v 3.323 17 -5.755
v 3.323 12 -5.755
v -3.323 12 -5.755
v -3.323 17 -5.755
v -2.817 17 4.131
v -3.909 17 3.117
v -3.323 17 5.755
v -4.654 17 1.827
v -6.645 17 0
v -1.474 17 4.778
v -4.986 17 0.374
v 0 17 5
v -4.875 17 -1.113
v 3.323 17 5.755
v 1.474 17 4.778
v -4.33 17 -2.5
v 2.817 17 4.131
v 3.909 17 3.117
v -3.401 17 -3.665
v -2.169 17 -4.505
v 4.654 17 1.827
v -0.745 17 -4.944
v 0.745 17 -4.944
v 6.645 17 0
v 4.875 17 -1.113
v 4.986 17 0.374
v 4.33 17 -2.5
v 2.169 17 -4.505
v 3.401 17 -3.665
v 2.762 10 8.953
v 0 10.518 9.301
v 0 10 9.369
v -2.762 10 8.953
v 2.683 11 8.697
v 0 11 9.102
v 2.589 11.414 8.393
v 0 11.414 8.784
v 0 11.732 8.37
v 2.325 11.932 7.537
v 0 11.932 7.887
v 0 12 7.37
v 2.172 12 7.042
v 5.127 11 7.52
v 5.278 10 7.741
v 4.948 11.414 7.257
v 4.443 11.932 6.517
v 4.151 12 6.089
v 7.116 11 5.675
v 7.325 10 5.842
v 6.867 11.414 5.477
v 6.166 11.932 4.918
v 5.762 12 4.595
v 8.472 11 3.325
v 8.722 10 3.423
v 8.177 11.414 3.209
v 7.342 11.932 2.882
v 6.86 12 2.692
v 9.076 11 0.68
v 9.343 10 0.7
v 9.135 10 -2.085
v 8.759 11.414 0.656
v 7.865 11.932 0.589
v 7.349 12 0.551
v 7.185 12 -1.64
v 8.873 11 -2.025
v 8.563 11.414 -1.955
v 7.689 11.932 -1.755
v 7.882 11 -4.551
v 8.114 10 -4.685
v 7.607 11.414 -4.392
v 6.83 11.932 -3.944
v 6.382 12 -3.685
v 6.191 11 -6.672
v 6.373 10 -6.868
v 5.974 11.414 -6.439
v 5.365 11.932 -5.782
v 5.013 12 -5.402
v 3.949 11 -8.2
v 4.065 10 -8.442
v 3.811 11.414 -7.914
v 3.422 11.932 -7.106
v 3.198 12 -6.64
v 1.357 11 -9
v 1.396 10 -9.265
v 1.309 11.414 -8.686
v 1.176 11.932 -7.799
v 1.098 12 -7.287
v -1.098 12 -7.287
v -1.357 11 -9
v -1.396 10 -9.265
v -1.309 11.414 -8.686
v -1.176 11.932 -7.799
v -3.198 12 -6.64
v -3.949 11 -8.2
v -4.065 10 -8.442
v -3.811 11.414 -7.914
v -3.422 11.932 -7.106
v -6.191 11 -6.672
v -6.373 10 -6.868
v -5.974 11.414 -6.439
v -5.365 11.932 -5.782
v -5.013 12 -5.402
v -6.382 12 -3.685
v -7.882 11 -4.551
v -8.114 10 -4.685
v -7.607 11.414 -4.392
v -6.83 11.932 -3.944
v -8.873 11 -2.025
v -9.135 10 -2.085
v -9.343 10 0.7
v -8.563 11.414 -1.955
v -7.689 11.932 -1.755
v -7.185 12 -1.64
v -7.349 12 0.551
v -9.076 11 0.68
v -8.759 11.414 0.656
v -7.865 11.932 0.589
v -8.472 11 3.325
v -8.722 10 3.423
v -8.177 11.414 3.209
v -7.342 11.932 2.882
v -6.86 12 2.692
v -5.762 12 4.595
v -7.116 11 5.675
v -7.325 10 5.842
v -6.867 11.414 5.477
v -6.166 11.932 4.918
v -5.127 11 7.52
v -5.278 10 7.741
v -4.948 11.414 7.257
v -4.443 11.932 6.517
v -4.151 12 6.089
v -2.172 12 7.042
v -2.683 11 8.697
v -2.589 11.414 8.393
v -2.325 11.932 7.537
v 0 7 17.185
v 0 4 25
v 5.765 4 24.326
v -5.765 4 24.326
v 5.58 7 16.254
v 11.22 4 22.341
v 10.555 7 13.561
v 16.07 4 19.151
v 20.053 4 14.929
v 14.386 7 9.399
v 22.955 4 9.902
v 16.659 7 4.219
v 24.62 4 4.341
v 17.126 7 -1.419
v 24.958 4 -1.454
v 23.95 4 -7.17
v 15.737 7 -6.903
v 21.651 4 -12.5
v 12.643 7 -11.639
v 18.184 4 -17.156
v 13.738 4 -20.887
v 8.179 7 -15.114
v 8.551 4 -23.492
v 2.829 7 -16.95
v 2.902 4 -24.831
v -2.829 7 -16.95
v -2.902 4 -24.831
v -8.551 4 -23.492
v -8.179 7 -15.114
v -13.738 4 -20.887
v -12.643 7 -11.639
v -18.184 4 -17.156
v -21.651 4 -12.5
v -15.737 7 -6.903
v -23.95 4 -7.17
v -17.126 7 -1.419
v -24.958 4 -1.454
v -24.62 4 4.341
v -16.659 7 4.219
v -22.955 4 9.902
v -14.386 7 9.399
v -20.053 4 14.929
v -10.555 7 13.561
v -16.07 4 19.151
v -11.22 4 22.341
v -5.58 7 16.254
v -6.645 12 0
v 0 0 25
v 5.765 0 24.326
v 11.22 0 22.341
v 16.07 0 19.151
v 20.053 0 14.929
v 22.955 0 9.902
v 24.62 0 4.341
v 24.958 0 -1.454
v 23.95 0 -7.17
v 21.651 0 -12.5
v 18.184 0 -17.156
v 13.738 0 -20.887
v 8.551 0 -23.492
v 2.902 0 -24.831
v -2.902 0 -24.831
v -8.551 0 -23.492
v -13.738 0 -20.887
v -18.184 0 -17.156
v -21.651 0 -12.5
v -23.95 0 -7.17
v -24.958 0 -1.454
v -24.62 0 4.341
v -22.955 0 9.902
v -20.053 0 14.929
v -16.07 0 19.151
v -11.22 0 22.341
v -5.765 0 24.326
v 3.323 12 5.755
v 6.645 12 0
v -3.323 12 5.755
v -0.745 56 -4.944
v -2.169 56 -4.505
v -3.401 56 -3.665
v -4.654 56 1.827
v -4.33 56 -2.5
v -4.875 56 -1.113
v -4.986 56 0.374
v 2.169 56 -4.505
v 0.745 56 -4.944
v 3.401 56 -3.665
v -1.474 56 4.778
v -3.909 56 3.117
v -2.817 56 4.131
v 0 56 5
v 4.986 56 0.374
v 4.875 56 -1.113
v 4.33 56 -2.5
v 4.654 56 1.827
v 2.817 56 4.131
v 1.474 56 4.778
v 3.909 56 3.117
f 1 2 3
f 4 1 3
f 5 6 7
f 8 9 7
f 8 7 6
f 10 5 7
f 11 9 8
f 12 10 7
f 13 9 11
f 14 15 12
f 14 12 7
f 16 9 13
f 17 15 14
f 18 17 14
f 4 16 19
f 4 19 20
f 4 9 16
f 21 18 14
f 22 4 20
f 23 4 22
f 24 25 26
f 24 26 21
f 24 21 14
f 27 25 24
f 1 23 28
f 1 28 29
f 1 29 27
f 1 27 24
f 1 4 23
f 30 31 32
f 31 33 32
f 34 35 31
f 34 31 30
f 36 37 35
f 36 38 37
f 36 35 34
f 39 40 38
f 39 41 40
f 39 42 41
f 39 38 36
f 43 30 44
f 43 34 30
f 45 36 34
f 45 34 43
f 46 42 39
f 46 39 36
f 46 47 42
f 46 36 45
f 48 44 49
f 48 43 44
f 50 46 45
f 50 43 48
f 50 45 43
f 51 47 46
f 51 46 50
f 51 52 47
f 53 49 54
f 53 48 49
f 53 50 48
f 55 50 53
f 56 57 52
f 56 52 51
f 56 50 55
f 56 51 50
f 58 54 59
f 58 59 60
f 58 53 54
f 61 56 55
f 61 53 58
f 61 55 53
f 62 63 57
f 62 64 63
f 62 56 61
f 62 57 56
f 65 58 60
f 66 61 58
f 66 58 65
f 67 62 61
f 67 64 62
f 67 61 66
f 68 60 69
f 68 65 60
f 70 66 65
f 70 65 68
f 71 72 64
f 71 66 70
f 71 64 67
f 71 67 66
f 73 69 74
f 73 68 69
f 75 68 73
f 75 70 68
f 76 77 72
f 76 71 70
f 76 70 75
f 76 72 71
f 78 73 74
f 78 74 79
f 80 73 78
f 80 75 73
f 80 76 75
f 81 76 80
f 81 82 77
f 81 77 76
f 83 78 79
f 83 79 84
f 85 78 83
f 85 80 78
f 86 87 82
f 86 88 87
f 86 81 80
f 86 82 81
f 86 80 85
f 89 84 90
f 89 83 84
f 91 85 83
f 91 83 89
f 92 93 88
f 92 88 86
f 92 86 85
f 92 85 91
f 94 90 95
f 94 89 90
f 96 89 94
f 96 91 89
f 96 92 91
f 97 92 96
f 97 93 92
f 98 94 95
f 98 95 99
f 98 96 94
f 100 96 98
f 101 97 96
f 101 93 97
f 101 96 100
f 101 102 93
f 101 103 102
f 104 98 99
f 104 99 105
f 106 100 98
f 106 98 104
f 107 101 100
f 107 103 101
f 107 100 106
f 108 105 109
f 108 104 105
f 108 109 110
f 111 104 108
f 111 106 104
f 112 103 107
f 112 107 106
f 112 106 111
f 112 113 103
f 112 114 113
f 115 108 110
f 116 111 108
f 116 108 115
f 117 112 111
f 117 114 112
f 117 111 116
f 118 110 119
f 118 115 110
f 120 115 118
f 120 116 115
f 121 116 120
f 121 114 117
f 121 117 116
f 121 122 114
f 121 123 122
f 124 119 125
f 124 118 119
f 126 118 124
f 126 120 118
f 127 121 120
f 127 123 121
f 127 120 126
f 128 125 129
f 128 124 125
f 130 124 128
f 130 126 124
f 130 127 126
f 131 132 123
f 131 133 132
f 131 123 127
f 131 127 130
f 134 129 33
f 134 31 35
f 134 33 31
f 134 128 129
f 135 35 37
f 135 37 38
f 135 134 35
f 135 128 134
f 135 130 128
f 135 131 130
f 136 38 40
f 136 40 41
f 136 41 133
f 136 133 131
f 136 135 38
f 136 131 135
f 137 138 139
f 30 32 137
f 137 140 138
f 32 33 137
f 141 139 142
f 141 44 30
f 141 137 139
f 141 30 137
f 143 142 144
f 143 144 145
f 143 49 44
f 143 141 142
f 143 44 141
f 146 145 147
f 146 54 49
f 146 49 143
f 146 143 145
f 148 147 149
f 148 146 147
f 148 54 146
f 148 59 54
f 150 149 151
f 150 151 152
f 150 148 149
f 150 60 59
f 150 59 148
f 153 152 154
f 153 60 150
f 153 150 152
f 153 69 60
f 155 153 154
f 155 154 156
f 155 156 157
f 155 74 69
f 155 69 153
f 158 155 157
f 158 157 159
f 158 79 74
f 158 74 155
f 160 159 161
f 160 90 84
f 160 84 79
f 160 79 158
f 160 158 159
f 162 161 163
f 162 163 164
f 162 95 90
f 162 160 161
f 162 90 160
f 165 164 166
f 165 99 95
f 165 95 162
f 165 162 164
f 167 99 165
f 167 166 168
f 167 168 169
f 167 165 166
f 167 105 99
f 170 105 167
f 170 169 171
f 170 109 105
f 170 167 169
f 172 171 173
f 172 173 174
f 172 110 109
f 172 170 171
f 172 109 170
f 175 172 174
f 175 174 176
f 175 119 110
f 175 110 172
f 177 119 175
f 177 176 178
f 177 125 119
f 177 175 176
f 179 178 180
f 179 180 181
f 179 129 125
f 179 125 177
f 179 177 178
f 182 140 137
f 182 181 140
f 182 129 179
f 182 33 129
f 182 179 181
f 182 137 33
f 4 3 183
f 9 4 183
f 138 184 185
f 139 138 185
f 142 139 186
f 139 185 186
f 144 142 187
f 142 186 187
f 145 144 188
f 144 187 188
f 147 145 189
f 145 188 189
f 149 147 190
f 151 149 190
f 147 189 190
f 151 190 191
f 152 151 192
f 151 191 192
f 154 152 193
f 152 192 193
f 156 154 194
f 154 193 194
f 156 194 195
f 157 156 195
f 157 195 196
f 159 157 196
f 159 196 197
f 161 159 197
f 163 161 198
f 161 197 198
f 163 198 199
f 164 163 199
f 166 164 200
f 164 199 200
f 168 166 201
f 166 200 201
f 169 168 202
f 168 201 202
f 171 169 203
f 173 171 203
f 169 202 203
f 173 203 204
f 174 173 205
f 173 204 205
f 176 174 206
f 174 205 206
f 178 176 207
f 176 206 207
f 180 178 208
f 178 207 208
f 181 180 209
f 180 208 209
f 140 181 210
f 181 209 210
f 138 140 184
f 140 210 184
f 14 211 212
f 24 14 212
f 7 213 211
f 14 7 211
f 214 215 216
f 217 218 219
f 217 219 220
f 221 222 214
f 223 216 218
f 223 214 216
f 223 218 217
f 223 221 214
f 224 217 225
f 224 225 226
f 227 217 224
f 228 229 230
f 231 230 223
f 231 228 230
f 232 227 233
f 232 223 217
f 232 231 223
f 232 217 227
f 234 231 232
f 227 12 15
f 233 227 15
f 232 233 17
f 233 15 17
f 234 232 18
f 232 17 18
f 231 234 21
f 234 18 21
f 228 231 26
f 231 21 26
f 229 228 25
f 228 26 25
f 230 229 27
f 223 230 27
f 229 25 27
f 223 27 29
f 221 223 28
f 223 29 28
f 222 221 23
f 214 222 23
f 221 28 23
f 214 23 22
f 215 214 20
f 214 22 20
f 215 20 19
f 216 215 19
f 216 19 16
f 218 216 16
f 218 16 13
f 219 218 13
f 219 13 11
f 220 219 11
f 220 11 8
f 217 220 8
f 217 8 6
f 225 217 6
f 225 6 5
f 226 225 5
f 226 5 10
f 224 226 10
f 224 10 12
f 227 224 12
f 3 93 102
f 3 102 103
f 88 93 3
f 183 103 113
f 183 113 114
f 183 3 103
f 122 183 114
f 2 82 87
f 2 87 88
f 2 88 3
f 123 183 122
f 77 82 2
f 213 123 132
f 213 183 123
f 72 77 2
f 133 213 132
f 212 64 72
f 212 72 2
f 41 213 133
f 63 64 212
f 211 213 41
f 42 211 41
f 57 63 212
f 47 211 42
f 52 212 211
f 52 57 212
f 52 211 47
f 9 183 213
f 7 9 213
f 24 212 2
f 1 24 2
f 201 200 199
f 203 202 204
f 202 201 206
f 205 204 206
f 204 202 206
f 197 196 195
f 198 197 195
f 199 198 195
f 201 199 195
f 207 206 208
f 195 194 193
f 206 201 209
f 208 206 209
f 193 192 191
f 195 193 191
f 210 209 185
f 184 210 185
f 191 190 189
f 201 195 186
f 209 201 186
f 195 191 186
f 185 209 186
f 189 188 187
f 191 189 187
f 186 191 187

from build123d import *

# Parameters (mm, degrees)
SKETCH2_R           = 25
BOSS_EXTRUDE1_DEPTH = 4
SKETCH4_R           = 25
BOSS_EXTRUDE2_DEPTH = 6
BOSS_EXTRUDE2_TAPER = 69
SKETCH5_R           = 9.369465612
BOSS_EXTRUDE3_DEPTH = 2
SKETCH6_R           = 5
BOSS_EXTRUDE4_DEPTH = 44
FILLET1_R           = 2
BOSS_EXTRUDE5_DEPTH = 5


with BuildPart() as part:
    # Sketch2 → Boss-Extrude1 (new body)
    with BuildSketch(Plane(origin=(0, 0, 0), x_dir=(1, 0, 0), z_dir=(0, 1, 0))):
        with Locations(Location((0, 0, 0), (0, 0, 270))):
            Circle(SKETCH2_R)
    extrude(amount=BOSS_EXTRUDE1_DEPTH)

    # Sketch4 → Boss-Extrude2 (add)
    with BuildSketch(Plane(origin=(0, 4, 0), x_dir=(1, 0, 0), z_dir=(0, 1, 0))):
        with Locations(Location((0, 0, 0), (0, 0, 270))):
            Circle(SKETCH4_R)
    extrude(amount=BOSS_EXTRUDE2_DEPTH, taper=BOSS_EXTRUDE2_TAPER)

    # Sketch5 → Boss-Extrude3 (add)
    with BuildSketch(Plane(origin=(0, 10, 0), x_dir=(1, 0, 0), z_dir=(0, 1, 0))):
        with Locations(Location((0, 0, 0), (0, 0, 270))):
            Circle(SKETCH5_R)
    extrude(amount=BOSS_EXTRUDE3_DEPTH)

    # Sketch6 → Boss-Extrude4 (add)
    with BuildSketch(Plane(origin=(0, 12, 0), x_dir=(1, 0, 0), z_dir=(0, 1, 0))):
        with Locations(Location((0, 0, 0), (0, 0, 270))):
            Circle(SKETCH6_R)
    extrude(amount=BOSS_EXTRUDE4_DEPTH)

    # Fillet1
    fillet1_edges = [part.edges().sort_by_distance(p)[0] for p in [
        (0, 12, -9.369465612),
    ]]
    fillet(fillet1_edges, radius=FILLET1_R - 0.0001)  # a hair under: the kernel refuses the full size

    # Sketch7 → Boss-Extrude5 (add)
    with BuildSketch(Plane(origin=(0, 12, 0), x_dir=(1, 0, 0), z_dir=(0, 1, 0))):
        Polygon((6.645053271, 0), (3.322526636, 5.754784943), (-3.322526636, 5.754784943), (-6.645053271, 0), (-3.322526636, -5.754784943), (3.322526636, -5.754784943), align=None)
    extrude(amount=BOSS_EXTRUDE5_DEPTH)


solid = part.part
